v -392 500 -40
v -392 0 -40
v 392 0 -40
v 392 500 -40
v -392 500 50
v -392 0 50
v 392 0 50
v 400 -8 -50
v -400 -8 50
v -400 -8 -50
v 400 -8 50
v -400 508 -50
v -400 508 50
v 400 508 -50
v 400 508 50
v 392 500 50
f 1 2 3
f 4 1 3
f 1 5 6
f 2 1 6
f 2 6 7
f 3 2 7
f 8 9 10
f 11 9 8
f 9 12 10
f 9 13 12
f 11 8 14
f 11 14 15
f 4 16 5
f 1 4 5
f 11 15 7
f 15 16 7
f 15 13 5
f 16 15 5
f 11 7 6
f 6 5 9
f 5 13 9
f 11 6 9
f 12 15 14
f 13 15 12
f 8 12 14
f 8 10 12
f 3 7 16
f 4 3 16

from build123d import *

# Parameters (mm, degrees)
F0_W     = 800
F0_H     = 100
F1_DEPTH = 8
F2_W     = 500
F2_H     = 100
F3_DEPTH = 8
F4_W     = 792
F4_H     = 100
F4_W_2   = 8
F5_DEPTH = 8
F6_W     = 500
F6_H     = 100
F7_DEPTH = 8
F8_W     = 784
F8_H     = 500
F9_DEPTH = 10


with BuildPart() as f1:
    # F0 (on Front) → F1 (new body)
    with BuildSketch(Plane.XZ):
        Rectangle(F0_W, F0_H)
    extrude(amount=F1_DEPTH)

    # F2 (on face) → F3 (join)
    with BuildSketch(Plane.YZ.offset(400)):
        with Locations((250, 0)):
            Rectangle(F2_W, F2_H)
    extrude(amount=-F3_DEPTH)

    # F4 (on face) → F5 (join)
    with BuildSketch(Plane(origin=(0, 500, 0), x_dir=(-1, 0, 0), z_dir=(0, 1, 0))):
        with Locations((4, 0)):
            Rectangle(F4_W, F4_H)
        with Locations((-396, 0)):
            Rectangle(F4_W_2, F4_H)
    extrude(amount=F5_DEPTH)

    # F6 (on face) → F7 (join)
    with BuildSketch(Plane(origin=(-400, 0, 0), x_dir=(0, -1, 0), z_dir=(-1, 0, 0))):
        with Locations((-250, 0)):
            Rectangle(F6_W, F6_H)
    extrude(amount=-F7_DEPTH)

    # F8 (on face) → F9 (join)
    with BuildSketch(Plane(origin=(0, 0, -50), x_dir=(1, 0, 0), z_dir=(0, 0, -1))):
        with Locations((0, -250)):
            Rectangle(F8_W, F8_H)
    extrude(amount=-F9_DEPTH)


solid = f1.part
